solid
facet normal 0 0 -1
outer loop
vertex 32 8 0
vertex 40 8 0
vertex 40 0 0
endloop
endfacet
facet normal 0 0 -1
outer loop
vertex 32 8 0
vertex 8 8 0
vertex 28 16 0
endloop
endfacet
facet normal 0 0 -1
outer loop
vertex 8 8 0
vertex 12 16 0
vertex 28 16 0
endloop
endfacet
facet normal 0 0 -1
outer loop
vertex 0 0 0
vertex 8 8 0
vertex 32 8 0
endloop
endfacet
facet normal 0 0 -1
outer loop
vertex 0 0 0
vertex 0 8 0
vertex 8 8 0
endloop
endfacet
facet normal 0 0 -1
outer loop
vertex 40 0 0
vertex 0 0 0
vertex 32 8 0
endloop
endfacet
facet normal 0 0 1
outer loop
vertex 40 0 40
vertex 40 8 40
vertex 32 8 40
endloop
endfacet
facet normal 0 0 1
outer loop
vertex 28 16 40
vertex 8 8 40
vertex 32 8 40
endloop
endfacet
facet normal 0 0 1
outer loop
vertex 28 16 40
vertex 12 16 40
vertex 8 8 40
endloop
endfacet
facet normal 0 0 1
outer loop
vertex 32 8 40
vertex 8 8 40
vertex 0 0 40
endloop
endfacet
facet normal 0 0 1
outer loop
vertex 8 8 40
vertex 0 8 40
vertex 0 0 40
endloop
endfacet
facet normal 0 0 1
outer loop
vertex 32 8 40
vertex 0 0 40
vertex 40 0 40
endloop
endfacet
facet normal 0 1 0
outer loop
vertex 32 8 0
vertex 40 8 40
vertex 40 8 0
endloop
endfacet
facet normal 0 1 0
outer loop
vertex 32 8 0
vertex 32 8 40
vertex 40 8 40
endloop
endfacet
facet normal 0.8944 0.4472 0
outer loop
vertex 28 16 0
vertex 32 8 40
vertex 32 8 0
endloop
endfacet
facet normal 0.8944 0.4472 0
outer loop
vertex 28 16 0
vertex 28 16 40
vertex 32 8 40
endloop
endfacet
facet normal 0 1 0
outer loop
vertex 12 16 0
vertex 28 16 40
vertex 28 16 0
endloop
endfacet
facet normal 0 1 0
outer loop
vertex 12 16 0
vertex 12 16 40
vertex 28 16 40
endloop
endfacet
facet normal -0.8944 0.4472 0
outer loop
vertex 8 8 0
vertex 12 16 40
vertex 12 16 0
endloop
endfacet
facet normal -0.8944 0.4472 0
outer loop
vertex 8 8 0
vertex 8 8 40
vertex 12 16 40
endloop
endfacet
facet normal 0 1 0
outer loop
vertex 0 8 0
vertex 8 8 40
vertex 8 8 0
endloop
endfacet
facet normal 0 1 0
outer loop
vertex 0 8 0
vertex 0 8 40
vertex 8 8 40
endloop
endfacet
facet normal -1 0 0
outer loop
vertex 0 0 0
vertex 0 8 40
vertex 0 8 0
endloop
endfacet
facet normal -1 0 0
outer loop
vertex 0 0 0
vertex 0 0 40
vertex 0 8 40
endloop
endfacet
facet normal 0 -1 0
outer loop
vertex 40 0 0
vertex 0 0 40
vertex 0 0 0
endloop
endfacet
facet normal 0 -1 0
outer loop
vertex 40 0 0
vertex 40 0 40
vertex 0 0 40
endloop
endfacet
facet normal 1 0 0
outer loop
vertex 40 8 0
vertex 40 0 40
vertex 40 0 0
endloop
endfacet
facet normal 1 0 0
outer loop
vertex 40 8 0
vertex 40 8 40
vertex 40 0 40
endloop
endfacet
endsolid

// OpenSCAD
$fn = 32;

// ----------------------------------------------------------------------
// V guide rail: dovetail, 40 mm wide
// ----------------------------------------------------------------------

// --- parameters (mm) ---
rail_w = 40;              // rail width, X
base_t = 8;               // base plate thickness
v_depth = 8;              // V feature depth / height
v_half_w = 12;            // half width of the V at the base face
plate_t = 40;             // rail length, Z (the extrusion height)
top_half_w = 8;           // half width at the dovetail top
fit_tol = 0.1;            // declared fit tolerance (prompt contract)
free_tol = 0.5;           // declared free tolerance (prompt contract)

dovetail_base = 2 * v_half_w;  // dovetail width at the base
dovetail_top = 2 * top_half_w;  // dovetail width at the top

profile = [[0, 0], [40, 0], [40, 8], [32, 8], [28, 16], [12, 16], [8, 8], [0, 8]];  // primary outline, 8 points, counter clockwise

// --- the one profile operation ---
linear_extrude(height = plate_t) polygon(points = profile);
